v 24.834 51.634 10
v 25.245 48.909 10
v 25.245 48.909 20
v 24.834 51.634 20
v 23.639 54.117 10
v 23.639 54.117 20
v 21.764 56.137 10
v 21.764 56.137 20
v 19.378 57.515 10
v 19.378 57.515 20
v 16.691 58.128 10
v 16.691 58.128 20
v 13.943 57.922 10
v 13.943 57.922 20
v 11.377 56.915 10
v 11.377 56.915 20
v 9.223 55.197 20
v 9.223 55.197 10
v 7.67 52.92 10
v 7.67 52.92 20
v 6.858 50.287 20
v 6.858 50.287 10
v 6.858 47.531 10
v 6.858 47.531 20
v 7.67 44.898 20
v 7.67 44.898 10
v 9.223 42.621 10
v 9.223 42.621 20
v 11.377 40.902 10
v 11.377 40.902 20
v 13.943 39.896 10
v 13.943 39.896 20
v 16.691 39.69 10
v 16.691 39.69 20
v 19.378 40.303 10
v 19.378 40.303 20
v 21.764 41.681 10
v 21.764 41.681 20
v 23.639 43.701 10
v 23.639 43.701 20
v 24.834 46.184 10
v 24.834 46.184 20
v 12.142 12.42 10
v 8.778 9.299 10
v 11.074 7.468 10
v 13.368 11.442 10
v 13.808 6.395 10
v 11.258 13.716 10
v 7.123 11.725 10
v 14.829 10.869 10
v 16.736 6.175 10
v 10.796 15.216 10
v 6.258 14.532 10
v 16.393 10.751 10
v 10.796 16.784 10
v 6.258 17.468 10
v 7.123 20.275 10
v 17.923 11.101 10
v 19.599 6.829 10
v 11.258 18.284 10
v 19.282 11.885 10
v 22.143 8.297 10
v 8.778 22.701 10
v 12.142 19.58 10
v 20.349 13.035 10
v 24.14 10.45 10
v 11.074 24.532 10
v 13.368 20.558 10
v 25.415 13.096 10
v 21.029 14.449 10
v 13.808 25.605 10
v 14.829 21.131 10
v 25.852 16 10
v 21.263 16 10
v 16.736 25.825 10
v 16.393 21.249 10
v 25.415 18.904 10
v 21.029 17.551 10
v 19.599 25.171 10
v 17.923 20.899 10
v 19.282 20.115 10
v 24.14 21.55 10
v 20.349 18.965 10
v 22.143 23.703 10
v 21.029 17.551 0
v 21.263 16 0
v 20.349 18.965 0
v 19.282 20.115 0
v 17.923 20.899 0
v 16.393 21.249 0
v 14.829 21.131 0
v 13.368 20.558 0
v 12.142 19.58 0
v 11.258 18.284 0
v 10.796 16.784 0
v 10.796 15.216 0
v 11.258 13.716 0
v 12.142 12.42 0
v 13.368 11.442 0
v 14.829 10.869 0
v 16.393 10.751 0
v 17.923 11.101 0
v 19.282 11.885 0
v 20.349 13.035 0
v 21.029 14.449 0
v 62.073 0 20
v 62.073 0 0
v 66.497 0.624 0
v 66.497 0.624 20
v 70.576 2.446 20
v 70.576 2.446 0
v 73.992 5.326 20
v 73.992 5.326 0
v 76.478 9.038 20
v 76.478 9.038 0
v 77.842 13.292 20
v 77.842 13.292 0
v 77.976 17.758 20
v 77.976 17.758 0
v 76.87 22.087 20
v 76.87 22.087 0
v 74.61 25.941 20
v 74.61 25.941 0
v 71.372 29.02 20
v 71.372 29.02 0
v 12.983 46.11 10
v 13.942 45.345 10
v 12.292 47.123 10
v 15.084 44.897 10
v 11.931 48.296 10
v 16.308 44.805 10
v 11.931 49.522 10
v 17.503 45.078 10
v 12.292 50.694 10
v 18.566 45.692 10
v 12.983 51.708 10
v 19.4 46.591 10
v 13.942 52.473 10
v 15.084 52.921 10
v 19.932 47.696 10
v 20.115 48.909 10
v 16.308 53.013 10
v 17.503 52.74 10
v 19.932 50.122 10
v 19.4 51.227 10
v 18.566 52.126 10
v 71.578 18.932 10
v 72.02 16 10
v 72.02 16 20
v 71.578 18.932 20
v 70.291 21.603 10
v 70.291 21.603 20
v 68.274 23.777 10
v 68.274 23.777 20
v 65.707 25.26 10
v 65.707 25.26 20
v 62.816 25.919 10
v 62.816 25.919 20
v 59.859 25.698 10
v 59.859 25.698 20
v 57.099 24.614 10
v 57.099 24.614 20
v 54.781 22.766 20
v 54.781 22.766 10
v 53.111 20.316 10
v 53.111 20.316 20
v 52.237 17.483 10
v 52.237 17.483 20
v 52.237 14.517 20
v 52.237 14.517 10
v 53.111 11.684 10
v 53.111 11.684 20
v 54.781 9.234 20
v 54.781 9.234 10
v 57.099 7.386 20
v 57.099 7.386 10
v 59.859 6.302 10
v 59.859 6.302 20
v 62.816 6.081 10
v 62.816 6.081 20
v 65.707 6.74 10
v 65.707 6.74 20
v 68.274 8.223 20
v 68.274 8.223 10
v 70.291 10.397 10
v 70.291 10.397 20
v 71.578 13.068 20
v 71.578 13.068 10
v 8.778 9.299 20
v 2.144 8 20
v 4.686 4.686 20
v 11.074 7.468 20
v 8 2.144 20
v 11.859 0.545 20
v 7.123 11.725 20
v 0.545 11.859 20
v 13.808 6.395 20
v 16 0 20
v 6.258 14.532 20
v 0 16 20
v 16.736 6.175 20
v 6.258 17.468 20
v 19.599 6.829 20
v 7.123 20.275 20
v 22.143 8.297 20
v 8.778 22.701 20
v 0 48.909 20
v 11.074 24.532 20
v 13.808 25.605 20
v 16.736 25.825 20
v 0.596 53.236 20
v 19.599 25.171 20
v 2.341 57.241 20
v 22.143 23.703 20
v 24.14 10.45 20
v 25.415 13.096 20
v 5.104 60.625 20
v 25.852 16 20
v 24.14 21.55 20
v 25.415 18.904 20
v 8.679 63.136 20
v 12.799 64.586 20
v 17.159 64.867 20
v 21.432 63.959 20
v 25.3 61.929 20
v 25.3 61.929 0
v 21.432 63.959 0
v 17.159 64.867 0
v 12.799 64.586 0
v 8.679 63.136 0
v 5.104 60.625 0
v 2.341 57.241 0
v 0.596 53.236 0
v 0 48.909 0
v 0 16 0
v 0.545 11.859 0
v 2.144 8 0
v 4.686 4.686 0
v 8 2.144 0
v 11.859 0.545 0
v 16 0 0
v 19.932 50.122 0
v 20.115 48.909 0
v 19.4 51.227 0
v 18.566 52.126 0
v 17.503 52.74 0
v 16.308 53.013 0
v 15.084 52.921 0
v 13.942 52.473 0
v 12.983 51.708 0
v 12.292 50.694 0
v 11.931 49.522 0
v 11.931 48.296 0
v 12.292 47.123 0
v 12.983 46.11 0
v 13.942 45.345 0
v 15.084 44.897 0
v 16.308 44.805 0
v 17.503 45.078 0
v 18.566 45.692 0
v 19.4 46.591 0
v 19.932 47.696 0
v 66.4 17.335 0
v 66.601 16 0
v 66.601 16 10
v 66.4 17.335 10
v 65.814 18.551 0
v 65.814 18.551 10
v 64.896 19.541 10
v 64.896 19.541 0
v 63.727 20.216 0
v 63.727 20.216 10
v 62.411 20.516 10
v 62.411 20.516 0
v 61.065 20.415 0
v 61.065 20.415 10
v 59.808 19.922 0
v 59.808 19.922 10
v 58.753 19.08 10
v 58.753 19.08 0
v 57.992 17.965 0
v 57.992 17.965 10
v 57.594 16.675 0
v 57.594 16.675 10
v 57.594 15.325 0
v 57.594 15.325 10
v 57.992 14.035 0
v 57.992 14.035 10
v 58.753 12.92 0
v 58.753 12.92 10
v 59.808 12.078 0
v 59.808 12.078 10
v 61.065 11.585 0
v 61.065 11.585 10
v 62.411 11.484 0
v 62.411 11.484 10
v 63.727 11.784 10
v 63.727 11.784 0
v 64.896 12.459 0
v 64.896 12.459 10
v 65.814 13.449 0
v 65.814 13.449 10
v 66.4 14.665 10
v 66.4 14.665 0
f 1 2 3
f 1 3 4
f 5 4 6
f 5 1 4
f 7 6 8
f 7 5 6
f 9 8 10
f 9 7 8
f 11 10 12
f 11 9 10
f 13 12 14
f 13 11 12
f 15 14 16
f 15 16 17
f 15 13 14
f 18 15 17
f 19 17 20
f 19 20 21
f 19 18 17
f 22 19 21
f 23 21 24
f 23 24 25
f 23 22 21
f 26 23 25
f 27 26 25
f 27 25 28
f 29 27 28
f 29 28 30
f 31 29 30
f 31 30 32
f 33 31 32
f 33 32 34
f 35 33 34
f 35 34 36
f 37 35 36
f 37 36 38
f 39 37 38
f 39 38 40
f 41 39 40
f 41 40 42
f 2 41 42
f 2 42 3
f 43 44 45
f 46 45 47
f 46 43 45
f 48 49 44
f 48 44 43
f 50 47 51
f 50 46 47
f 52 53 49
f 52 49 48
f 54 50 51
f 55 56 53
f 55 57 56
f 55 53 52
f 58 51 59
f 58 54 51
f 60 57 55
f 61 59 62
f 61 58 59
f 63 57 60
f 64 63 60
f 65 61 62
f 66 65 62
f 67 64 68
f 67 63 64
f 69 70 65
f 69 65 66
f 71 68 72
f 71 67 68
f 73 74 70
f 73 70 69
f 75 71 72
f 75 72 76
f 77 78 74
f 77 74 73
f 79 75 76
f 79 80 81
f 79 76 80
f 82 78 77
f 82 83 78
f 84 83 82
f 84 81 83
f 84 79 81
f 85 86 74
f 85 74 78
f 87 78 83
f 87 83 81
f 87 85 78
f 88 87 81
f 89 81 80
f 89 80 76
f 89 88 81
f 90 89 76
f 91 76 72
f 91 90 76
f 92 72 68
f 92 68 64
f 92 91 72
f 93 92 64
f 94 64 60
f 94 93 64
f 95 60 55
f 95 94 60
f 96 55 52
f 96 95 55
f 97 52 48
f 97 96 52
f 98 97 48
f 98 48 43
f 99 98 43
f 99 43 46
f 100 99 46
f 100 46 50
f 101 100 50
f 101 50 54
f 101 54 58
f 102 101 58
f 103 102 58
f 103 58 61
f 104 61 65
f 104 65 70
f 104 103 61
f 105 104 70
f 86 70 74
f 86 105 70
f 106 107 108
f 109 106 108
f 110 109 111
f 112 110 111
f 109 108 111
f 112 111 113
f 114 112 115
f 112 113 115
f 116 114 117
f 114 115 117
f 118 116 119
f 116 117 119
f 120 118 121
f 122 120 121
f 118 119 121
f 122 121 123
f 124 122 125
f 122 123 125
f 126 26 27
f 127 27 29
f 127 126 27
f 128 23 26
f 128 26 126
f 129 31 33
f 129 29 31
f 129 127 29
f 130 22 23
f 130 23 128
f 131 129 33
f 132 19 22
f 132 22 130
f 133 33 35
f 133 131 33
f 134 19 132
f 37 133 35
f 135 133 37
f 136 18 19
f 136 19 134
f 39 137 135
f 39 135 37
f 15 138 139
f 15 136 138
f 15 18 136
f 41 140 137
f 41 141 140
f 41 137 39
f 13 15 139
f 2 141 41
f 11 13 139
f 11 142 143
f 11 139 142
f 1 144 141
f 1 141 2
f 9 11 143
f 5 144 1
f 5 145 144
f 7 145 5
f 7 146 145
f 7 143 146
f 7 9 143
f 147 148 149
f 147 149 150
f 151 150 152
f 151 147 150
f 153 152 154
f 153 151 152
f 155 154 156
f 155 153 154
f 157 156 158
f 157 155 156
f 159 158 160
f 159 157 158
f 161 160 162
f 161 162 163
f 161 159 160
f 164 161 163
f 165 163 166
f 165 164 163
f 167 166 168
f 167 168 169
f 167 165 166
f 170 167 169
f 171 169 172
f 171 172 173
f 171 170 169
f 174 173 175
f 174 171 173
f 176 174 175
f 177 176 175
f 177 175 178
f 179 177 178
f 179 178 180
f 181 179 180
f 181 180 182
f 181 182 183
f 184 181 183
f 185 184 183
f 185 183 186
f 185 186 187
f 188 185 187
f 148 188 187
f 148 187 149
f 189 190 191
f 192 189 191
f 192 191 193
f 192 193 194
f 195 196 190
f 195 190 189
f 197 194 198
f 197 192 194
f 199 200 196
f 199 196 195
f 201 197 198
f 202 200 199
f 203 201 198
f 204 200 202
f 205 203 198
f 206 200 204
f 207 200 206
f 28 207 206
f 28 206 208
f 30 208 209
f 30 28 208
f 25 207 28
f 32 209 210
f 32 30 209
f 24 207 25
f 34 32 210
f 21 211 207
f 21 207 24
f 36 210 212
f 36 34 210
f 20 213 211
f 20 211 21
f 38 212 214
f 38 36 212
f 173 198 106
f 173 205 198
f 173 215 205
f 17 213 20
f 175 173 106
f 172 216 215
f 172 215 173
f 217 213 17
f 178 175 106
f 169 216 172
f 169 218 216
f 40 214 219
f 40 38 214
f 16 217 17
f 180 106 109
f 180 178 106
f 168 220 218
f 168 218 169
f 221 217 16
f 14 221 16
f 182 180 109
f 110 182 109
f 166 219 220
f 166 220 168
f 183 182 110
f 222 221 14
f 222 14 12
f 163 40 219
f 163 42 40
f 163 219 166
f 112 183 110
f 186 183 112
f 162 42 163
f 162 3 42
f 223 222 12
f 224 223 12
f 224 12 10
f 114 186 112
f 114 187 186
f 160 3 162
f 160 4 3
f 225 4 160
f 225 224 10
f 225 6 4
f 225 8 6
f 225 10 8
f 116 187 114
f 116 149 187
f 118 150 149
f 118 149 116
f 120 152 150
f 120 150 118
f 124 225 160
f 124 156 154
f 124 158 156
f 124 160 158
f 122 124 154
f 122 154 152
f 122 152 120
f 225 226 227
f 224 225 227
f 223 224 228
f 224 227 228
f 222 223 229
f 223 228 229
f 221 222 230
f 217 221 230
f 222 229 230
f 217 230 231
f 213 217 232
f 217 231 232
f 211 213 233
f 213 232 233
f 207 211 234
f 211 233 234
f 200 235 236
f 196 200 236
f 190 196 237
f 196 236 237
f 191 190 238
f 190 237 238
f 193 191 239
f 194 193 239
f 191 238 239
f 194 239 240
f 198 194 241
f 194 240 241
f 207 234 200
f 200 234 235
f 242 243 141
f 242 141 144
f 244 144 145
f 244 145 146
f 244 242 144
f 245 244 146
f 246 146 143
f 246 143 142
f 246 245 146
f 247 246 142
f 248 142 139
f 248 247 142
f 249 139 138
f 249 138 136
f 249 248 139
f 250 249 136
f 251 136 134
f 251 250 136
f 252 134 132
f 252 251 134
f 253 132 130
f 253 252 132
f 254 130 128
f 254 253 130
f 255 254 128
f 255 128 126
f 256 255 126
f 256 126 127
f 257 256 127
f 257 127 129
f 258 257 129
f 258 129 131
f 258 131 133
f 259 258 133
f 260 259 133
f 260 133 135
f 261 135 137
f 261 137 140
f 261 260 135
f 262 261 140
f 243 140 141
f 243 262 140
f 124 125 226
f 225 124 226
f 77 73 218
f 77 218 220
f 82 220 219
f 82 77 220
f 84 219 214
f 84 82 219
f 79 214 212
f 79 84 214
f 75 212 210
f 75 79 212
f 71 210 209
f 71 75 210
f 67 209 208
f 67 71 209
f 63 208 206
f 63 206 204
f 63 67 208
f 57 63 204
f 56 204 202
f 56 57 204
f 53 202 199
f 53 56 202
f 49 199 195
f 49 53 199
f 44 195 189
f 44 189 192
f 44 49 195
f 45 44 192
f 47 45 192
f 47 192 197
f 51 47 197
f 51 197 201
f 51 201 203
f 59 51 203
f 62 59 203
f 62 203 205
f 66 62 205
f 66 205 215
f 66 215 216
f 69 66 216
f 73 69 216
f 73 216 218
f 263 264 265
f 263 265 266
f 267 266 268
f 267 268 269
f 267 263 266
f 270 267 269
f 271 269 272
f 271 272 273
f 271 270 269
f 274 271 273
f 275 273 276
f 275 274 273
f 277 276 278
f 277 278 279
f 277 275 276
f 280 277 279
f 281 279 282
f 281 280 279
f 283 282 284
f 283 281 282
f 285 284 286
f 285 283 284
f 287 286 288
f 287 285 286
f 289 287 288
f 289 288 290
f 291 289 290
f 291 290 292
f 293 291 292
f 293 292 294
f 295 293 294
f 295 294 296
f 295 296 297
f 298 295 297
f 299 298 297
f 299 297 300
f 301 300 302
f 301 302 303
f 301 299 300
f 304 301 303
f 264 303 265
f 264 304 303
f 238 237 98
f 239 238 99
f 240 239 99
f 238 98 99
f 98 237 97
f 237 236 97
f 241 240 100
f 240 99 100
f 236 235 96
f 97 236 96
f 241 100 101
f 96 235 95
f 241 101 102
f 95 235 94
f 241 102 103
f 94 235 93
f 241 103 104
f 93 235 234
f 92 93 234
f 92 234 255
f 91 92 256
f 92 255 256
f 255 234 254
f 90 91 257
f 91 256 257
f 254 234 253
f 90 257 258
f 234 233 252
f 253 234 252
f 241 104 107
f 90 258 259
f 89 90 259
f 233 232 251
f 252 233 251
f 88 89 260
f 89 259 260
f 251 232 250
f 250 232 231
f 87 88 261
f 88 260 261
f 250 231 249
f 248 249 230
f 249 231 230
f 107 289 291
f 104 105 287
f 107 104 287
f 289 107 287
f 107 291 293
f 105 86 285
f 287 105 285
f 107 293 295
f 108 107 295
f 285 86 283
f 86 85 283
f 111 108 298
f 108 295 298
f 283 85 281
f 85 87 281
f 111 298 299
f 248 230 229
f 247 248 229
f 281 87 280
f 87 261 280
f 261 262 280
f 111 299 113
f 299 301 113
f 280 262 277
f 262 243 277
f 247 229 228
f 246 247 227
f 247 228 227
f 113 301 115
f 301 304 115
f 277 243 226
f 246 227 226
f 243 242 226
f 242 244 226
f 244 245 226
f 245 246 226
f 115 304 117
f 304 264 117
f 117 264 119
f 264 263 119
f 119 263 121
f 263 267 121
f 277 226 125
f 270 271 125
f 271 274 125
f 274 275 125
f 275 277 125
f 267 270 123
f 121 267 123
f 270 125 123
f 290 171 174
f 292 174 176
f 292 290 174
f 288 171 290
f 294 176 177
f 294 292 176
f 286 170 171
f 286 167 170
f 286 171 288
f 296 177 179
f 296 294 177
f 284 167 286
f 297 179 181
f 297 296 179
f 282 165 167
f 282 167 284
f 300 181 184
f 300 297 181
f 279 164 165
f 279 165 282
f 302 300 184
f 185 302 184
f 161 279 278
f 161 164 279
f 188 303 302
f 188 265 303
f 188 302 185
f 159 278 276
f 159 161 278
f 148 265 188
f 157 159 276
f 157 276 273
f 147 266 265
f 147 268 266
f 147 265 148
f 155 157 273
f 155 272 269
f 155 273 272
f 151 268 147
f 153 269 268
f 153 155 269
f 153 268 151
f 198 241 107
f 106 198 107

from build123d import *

# Parameters (mm, degrees)
F0_R     = 9.852424
F0_R_2   = 9.947133
F0_R_3   = 9.245087
F1_DEPTH = 20
F0_R_4   = 4.115098
F0_R_5   = 5.263248
F0_R_6   = 4.528776
F2_DEPTH = 10


with BuildPart() as f1:
    # F0 (on Top) → F1 (new body)
    with BuildSketch(Plane.XY):
        with BuildLine():
            ThreePointArc((0, 16), (4.686292, 4.686292), (16, 0))
            Line((16, 0), (62.072559, 0))
            ThreePointArc((62.072559, 0), (77.309287, 11.117161), (71.37237, 29.019736))
            Line((71.37237, 29.019736), (25.299811, 61.928706))
            ThreePointArc((25.299811, 61.928706), (8.678695, 63.135653), (0, 48.908971))
            Line((0, 48.908971), (0, 16))
        make_face()
        with Locations((16, 16)):
            Circle(F0_R, mode=Mode.SUBTRACT)
        with Locations((62.072559, 16)):
            Circle(F0_R_2, mode=Mode.SUBTRACT)
        with Locations((16, 48.908971)):
            Circle(F0_R_3, mode=Mode.SUBTRACT)
    extrude(amount=F1_DEPTH)

    # F0 (on Top) → F2 (join)
    with BuildSketch(Plane.XY):
        with BuildLine():
            ThreePointArc((0, 16), (4.686292, 4.686292), (16, 0))
            Line((16, 0), (62.072559, 0))
            ThreePointArc((62.072559, 0), (77.309287, 11.117161), (71.37237, 29.019736))
            Line((71.37237, 29.019736), (25.299811, 61.928706))
            ThreePointArc((25.299811, 61.928706), (8.678695, 63.135653), (0, 48.908971))
            Line((0, 48.908971), (0, 16))
        make_face()
        with Locations((16, 16)):
            Circle(F0_R, mode=Mode.SUBTRACT)
        with Locations((62.072559, 16)):
            Circle(F0_R_2, mode=Mode.SUBTRACT)
        with Locations((16, 48.908971)):
            Circle(F0_R_3, mode=Mode.SUBTRACT)
        with Locations((16, 48.908971)):
            Circle(F0_R_3)
        with Locations((16, 48.908971)):
            Circle(F0_R_4, mode=Mode.SUBTRACT)
        with Locations((16, 16)):
            Circle(F0_R)
        with Locations((16, 16)):
            Circle(F0_R_5, mode=Mode.SUBTRACT)
        with Locations((62.072559, 16)):
            Circle(F0_R_2)
        with Locations((62.072559, 16)):
            Circle(F0_R_6, mode=Mode.SUBTRACT)
    extrude(amount=F2_DEPTH)


solid = f1.part
